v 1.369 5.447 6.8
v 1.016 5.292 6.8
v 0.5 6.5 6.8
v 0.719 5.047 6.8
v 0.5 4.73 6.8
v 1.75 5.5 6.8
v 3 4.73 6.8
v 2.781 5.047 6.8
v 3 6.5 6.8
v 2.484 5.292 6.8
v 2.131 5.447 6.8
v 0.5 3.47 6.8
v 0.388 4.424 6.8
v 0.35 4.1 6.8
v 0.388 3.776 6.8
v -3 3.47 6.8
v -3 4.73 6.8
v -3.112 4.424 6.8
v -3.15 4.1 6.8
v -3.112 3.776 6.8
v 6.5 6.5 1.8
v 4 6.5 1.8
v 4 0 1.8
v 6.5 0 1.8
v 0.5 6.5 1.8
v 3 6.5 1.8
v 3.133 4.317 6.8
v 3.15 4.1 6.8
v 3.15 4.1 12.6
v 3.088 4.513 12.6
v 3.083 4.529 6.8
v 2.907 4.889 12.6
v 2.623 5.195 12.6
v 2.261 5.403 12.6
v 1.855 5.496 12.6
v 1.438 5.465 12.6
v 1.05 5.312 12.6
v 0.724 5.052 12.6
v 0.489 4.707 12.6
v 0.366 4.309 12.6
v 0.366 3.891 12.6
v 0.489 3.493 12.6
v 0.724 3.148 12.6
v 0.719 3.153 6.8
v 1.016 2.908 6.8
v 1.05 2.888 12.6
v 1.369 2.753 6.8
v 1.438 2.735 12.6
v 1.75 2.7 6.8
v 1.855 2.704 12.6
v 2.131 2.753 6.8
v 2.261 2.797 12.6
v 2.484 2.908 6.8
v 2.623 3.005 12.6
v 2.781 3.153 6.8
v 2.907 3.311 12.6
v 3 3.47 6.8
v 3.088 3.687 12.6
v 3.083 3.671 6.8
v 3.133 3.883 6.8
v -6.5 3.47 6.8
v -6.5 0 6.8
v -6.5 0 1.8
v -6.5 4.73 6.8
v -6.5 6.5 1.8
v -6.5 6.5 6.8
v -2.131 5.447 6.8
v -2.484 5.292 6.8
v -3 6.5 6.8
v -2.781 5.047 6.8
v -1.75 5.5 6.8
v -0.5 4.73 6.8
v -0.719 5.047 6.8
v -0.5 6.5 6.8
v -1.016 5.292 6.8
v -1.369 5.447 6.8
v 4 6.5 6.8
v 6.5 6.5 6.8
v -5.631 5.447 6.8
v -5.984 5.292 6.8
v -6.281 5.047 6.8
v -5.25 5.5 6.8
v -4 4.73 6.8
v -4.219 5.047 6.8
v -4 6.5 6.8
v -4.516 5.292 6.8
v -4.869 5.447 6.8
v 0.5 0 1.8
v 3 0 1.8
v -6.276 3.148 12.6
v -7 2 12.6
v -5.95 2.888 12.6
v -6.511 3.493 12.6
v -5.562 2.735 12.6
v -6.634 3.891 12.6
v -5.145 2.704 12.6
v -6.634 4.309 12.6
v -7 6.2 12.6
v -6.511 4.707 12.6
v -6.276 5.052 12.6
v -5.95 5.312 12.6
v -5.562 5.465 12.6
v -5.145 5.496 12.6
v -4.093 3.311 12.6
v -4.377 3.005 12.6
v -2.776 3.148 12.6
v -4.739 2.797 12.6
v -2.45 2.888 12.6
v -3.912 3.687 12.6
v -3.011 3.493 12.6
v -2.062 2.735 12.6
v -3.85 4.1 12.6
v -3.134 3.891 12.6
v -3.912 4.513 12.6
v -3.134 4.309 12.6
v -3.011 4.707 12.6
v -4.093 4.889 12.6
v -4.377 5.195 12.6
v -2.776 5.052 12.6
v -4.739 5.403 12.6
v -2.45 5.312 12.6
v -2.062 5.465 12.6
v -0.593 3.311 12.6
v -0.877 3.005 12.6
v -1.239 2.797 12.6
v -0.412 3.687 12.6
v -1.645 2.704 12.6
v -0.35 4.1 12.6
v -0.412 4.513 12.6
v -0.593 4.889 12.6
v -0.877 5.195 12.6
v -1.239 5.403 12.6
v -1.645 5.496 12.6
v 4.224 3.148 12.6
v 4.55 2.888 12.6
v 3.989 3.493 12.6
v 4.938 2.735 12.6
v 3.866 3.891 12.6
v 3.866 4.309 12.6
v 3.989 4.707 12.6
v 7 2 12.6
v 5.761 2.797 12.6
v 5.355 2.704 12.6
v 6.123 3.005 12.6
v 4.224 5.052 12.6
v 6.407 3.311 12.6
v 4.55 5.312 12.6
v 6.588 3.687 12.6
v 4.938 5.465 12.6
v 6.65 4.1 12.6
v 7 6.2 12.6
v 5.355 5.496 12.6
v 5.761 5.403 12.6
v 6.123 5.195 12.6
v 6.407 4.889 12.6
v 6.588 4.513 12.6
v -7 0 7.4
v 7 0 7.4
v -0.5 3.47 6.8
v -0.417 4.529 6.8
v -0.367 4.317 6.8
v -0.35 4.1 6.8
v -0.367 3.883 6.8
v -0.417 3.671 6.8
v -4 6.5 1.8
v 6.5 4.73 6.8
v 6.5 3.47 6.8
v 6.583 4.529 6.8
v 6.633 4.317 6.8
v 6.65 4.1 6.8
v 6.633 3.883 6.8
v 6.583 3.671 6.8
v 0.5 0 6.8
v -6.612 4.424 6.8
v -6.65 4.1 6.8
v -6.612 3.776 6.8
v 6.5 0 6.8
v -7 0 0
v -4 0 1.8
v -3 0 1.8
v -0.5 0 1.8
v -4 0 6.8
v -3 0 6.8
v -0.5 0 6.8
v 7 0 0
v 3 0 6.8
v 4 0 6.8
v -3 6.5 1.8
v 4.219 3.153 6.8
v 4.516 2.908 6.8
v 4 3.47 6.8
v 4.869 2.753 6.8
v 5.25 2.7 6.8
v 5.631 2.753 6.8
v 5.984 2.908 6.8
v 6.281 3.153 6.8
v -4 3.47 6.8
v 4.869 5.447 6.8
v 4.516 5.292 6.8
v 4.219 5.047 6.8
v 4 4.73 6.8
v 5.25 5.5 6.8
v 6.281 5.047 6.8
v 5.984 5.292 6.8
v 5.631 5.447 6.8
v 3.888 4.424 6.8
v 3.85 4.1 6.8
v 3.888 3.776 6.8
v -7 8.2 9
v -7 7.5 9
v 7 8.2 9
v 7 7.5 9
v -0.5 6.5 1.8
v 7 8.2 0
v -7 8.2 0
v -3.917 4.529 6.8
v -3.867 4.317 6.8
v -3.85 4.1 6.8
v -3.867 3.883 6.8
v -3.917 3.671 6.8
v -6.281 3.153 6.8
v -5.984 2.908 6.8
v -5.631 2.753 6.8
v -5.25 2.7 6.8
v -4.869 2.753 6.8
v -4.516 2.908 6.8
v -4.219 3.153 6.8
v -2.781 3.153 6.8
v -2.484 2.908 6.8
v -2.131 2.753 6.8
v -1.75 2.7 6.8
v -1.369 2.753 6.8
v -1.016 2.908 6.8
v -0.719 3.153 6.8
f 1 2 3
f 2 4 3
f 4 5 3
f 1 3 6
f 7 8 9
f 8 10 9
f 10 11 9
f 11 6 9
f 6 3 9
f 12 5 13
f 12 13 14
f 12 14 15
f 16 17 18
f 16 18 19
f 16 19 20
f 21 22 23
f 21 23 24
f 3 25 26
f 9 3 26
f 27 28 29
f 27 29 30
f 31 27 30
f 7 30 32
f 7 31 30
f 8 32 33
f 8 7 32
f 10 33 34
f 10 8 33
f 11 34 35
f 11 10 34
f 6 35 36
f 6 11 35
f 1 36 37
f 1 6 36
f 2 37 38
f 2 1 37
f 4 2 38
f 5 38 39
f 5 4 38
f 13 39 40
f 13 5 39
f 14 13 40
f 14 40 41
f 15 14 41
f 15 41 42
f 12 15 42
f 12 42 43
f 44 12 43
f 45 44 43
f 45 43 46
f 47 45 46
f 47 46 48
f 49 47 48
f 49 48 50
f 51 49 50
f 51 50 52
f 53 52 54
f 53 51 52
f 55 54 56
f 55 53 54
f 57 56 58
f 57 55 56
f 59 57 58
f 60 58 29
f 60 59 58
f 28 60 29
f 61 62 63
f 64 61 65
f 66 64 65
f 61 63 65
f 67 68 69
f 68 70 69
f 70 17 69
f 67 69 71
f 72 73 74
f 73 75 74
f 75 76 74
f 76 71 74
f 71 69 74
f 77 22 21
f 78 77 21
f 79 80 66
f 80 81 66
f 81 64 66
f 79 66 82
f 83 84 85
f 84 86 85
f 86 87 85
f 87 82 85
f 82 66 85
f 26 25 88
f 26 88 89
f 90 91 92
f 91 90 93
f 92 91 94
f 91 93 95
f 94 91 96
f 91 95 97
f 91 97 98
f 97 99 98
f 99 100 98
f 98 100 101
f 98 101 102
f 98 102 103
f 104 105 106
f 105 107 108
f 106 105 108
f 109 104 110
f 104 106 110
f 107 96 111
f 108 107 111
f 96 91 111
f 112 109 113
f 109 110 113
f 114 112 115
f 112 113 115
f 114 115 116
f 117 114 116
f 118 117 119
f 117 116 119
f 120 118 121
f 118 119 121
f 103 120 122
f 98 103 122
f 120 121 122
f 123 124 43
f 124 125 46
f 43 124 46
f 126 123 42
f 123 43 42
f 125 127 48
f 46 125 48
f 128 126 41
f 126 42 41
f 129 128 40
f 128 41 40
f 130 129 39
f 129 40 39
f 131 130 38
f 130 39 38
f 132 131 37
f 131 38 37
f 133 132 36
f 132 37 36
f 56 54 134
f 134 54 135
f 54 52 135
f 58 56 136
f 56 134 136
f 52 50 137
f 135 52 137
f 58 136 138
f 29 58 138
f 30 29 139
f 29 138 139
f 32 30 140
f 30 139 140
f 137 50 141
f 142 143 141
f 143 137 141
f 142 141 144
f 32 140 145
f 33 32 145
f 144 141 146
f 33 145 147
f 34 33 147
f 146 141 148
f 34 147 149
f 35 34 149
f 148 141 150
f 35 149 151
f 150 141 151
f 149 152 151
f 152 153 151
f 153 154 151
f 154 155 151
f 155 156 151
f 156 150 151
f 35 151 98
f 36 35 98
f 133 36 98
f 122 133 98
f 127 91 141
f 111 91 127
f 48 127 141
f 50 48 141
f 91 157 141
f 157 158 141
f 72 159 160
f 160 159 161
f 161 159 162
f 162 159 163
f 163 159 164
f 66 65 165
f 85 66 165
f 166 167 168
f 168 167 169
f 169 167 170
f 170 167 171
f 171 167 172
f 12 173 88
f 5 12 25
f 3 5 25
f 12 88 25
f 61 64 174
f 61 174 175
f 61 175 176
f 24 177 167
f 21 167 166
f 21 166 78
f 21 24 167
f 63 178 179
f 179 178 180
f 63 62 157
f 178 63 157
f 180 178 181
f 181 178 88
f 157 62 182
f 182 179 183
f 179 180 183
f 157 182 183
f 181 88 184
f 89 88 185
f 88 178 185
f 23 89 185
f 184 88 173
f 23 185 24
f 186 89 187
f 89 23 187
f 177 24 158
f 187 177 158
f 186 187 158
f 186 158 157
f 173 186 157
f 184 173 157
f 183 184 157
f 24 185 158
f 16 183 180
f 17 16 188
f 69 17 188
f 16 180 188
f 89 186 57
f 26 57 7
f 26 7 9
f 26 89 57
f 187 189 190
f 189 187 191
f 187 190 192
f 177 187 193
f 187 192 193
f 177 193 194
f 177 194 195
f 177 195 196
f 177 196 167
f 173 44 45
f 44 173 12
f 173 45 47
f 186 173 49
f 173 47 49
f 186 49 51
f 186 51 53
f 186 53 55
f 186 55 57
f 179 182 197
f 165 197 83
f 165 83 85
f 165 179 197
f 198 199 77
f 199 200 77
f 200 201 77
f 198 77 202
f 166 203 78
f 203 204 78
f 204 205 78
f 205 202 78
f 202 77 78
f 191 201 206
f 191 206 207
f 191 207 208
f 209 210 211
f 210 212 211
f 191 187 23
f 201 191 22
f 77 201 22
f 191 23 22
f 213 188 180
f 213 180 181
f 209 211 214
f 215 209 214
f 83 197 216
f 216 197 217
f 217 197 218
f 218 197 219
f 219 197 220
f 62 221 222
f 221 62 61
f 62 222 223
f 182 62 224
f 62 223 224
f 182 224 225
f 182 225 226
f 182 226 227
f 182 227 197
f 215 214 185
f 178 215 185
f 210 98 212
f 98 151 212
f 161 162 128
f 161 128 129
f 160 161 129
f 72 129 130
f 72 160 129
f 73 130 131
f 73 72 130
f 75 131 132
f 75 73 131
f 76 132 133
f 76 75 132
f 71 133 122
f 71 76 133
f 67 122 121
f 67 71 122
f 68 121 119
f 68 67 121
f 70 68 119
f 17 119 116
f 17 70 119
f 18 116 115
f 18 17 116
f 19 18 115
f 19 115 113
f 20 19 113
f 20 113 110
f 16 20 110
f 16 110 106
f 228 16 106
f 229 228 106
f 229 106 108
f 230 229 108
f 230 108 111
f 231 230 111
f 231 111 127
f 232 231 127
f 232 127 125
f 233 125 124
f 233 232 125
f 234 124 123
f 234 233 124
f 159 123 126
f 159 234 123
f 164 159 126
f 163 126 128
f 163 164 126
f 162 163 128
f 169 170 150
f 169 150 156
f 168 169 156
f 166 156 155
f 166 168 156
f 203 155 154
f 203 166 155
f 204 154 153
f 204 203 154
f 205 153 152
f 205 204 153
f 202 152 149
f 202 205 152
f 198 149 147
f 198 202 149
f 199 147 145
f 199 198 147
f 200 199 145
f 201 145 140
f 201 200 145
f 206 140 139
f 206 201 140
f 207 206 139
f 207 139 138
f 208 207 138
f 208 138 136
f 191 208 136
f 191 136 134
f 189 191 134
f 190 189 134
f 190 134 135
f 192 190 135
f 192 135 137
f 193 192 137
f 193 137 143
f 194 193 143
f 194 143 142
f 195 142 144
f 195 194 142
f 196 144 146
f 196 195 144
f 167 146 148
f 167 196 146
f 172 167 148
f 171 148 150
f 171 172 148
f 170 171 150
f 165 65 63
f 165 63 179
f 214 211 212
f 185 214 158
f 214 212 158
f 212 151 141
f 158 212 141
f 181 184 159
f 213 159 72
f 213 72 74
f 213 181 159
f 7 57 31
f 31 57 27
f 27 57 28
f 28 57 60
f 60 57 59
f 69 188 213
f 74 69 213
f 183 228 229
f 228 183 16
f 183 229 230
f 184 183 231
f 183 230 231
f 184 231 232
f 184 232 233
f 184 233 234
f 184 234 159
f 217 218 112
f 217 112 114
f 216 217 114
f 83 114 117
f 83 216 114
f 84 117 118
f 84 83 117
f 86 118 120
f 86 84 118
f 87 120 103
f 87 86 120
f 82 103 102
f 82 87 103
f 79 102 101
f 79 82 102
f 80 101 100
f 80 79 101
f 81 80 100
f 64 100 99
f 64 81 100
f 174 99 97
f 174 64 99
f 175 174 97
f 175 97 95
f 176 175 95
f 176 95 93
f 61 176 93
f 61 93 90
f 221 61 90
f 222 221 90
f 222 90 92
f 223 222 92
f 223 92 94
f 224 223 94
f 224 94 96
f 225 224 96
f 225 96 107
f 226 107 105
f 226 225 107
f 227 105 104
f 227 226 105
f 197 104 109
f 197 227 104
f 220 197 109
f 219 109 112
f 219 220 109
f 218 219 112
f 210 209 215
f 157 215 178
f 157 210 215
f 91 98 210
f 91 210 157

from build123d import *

# Parameters (mm, degrees)
BOX005_W          = 2.5
BOX005_H          = 6.5
BOX005_DEPTH      = 5
BOX006_W          = 2.5
BOX006_H          = 6.5
BOX006_DEPTH      = 5
BOX007_W          = 2.5
BOX007_H          = 6.5
BOX007_DEPTH      = 5
BOX004_W          = 2.5
BOX004_H          = 6.5
BOX004_DEPTH      = 5
CYLINDER001_R     = 1.4
CYLINDER001_DEPTH = 6.1
CYLINDER002_R     = 1.4
CYLINDER002_DEPTH = 6.1
CYLINDER003_R     = 1.4
CYLINDER003_DEPTH = 6.1
CYLINDER_R        = 1.4
CYLINDER_DEPTH    = 6.1
EXTRUDE_DEPTH     = 7


with BuildPart() as cube001:
    # Box005 → Box005 (new body)
    with BuildSketch(Plane(origin=(-3, 0, 1.8), x_dir=(1, 0, 0), z_dir=(0, 0, 1))):
        with Locations((1.25, 3.25)):
            Rectangle(BOX005_W, BOX005_H)
    extrude(amount=BOX005_DEPTH)


with BuildPart() as cube002:
    # Box006 → Box006 (new body)
    with BuildSketch(Plane(origin=(0.5, 0, 1.8), x_dir=(1, 0, 0), z_dir=(0, 0, 1))):
        with Locations((1.25, 3.25)):
            Rectangle(BOX006_W, BOX006_H)
    extrude(amount=BOX006_DEPTH)


with BuildPart() as cube003:
    # Box007 → Box007 (new body)
    with BuildSketch(Plane(origin=(4, 0, 1.8), x_dir=(1, 0, 0), z_dir=(0, 0, 1))):
        with Locations((1.25, 3.25)):
            Rectangle(BOX007_W, BOX007_H)
    extrude(amount=BOX007_DEPTH)


with BuildPart() as cube:
    # Box004 → Box004 (new body)
    with BuildSketch(Plane(origin=(-6.5, 0, 1.8), x_dir=(1, 0, 0), z_dir=(0, 0, 1))):
        with Locations((1.25, 3.25)):
            Rectangle(BOX004_W, BOX004_H)
    extrude(amount=BOX004_DEPTH)


with BuildPart() as cylinder001:
    # Cylinder001 → Cylinder001 (new body)
    with BuildSketch(Plane(origin=(5.25, 4.1, 6.8), x_dir=(1, 0, 0), z_dir=(0, 0, 1))):
        Circle(CYLINDER001_R)
    extrude(amount=CYLINDER001_DEPTH)


with BuildPart() as cylinder002:
    # Cylinder002 → Cylinder002 (new body)
    with BuildSketch(Plane(origin=(-1.75, 4.1, 6.8), x_dir=(1, 0, 0), z_dir=(0, 0, 1))):
        Circle(CYLINDER002_R)
    extrude(amount=CYLINDER002_DEPTH)


with BuildPart() as cylinder003:
    # Cylinder003 → Cylinder003 (new body)
    with BuildSketch(Plane(origin=(-5.25, 4.1, 6.8), x_dir=(1, 0, 0), z_dir=(0, 0, 1))):
        Circle(CYLINDER003_R)
    extrude(amount=CYLINDER003_DEPTH)


with BuildPart() as cylinder:
    # Cylinder → Cylinder (new body)
    with BuildSketch(Plane(origin=(1.75, 4.1, 6.8), x_dir=(1, 0, 0), z_dir=(0, 0, 1))):
        Circle(CYLINDER_R)
    extrude(amount=CYLINDER_DEPTH)


with BuildPart() as plastic_body:
    # Wire → Extrude (new body, symmetric)
    with BuildSketch(Plane.YZ):
        Polygon((0, 0), (0, 7.4), (2, 12.6), (6.2, 12.6), (7.5, 9), (8.2, 9), (8.2, 0), align=None)
    extrude(amount=EXTRUDE_DEPTH, both=True)

    # Cut: cut Cylinder
    add(cylinder.part, mode=Mode.SUBTRACT)

    # Cut001: cut Cylinder003
    add(cylinder003.part, mode=Mode.SUBTRACT)

    # Cut002: cut Cylinder002
    add(cylinder002.part, mode=Mode.SUBTRACT)

    # Cut003: cut Cylinder001
    add(cylinder001.part, mode=Mode.SUBTRACT)

    # Cut004: cut Cube
    add(cube.part, mode=Mode.SUBTRACT)

    # Cut005: cut Cube003
    add(cube003.part, mode=Mode.SUBTRACT)

    # Cut006: cut Cube002
    add(cube002.part, mode=Mode.SUBTRACT)

    # Cut007: cut Cube001
    add(cube001.part, mode=Mode.SUBTRACT)


solid = plastic_body.part
